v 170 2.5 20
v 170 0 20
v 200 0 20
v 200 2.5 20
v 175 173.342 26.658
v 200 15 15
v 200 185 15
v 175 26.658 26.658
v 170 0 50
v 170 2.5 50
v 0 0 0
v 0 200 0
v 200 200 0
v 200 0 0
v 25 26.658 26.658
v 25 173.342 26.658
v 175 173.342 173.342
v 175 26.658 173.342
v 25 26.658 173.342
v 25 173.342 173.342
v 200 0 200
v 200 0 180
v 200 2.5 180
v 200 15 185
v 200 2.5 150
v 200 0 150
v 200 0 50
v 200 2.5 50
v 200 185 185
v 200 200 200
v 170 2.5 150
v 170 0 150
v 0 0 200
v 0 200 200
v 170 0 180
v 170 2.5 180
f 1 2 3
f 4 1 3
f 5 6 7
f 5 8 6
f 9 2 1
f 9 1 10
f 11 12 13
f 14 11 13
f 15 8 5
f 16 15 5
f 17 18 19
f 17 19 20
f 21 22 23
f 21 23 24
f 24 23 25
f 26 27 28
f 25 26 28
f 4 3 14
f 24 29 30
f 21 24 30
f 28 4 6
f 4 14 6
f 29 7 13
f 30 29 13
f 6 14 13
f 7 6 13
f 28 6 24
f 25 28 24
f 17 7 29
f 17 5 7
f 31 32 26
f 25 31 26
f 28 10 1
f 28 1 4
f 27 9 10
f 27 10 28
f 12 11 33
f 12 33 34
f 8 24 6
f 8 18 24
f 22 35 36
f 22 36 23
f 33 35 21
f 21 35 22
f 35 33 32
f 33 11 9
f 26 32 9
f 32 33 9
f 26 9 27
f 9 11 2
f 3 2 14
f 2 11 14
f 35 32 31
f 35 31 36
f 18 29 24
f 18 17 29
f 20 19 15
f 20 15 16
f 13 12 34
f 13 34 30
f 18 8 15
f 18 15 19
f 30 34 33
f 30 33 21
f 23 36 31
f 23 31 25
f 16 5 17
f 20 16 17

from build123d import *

# Parameters (mm, degrees)
F0_W     = 200
F0_H     = 200
F1_DEPTH = 200
F2_W     = 170
F2_H     = 170
F3_DEPTH = 25
F3_TAPER = 25
F4_W     = 146.6846170923
F4_H     = 146.6846170923
F5_DEPTH = 150
F6_W     = 30
F6_H     = 30
F7_DEPTH = 2.5


with BuildPart() as f1:
    # F0 (on Top) → F1 (new body)
    with BuildSketch(Plane.XY):
        with Locations((100, 100)):
            Rectangle(F0_W, F0_H)
    extrude(amount=F1_DEPTH)

    # F2 (on face) → F3 (cut)
    with BuildSketch(Plane.YZ.offset(200)):
        with Locations((100, 100)):
            Rectangle(F2_W, F2_H)
    extrude(amount=-F3_DEPTH, taper=F3_TAPER, mode=Mode.SUBTRACT)

    # F4 (on face) → F5 (cut)
    with BuildSketch(Plane.YZ.offset(175)):
        with Locations((100, 100)):
            Rectangle(F4_W, F4_H)
    extrude(amount=-F5_DEPTH, mode=Mode.SUBTRACT)

    # F6 (on face) → F7 (cut)
    with BuildSketch(Plane.XZ):
        with Locations((185, 165)):
            Rectangle(F6_W, F6_H)
        with Locations((185, 35)):
            Rectangle(F6_W, F6_H)
    extrude(amount=-F7_DEPTH, mode=Mode.SUBTRACT)


solid = f1.part
